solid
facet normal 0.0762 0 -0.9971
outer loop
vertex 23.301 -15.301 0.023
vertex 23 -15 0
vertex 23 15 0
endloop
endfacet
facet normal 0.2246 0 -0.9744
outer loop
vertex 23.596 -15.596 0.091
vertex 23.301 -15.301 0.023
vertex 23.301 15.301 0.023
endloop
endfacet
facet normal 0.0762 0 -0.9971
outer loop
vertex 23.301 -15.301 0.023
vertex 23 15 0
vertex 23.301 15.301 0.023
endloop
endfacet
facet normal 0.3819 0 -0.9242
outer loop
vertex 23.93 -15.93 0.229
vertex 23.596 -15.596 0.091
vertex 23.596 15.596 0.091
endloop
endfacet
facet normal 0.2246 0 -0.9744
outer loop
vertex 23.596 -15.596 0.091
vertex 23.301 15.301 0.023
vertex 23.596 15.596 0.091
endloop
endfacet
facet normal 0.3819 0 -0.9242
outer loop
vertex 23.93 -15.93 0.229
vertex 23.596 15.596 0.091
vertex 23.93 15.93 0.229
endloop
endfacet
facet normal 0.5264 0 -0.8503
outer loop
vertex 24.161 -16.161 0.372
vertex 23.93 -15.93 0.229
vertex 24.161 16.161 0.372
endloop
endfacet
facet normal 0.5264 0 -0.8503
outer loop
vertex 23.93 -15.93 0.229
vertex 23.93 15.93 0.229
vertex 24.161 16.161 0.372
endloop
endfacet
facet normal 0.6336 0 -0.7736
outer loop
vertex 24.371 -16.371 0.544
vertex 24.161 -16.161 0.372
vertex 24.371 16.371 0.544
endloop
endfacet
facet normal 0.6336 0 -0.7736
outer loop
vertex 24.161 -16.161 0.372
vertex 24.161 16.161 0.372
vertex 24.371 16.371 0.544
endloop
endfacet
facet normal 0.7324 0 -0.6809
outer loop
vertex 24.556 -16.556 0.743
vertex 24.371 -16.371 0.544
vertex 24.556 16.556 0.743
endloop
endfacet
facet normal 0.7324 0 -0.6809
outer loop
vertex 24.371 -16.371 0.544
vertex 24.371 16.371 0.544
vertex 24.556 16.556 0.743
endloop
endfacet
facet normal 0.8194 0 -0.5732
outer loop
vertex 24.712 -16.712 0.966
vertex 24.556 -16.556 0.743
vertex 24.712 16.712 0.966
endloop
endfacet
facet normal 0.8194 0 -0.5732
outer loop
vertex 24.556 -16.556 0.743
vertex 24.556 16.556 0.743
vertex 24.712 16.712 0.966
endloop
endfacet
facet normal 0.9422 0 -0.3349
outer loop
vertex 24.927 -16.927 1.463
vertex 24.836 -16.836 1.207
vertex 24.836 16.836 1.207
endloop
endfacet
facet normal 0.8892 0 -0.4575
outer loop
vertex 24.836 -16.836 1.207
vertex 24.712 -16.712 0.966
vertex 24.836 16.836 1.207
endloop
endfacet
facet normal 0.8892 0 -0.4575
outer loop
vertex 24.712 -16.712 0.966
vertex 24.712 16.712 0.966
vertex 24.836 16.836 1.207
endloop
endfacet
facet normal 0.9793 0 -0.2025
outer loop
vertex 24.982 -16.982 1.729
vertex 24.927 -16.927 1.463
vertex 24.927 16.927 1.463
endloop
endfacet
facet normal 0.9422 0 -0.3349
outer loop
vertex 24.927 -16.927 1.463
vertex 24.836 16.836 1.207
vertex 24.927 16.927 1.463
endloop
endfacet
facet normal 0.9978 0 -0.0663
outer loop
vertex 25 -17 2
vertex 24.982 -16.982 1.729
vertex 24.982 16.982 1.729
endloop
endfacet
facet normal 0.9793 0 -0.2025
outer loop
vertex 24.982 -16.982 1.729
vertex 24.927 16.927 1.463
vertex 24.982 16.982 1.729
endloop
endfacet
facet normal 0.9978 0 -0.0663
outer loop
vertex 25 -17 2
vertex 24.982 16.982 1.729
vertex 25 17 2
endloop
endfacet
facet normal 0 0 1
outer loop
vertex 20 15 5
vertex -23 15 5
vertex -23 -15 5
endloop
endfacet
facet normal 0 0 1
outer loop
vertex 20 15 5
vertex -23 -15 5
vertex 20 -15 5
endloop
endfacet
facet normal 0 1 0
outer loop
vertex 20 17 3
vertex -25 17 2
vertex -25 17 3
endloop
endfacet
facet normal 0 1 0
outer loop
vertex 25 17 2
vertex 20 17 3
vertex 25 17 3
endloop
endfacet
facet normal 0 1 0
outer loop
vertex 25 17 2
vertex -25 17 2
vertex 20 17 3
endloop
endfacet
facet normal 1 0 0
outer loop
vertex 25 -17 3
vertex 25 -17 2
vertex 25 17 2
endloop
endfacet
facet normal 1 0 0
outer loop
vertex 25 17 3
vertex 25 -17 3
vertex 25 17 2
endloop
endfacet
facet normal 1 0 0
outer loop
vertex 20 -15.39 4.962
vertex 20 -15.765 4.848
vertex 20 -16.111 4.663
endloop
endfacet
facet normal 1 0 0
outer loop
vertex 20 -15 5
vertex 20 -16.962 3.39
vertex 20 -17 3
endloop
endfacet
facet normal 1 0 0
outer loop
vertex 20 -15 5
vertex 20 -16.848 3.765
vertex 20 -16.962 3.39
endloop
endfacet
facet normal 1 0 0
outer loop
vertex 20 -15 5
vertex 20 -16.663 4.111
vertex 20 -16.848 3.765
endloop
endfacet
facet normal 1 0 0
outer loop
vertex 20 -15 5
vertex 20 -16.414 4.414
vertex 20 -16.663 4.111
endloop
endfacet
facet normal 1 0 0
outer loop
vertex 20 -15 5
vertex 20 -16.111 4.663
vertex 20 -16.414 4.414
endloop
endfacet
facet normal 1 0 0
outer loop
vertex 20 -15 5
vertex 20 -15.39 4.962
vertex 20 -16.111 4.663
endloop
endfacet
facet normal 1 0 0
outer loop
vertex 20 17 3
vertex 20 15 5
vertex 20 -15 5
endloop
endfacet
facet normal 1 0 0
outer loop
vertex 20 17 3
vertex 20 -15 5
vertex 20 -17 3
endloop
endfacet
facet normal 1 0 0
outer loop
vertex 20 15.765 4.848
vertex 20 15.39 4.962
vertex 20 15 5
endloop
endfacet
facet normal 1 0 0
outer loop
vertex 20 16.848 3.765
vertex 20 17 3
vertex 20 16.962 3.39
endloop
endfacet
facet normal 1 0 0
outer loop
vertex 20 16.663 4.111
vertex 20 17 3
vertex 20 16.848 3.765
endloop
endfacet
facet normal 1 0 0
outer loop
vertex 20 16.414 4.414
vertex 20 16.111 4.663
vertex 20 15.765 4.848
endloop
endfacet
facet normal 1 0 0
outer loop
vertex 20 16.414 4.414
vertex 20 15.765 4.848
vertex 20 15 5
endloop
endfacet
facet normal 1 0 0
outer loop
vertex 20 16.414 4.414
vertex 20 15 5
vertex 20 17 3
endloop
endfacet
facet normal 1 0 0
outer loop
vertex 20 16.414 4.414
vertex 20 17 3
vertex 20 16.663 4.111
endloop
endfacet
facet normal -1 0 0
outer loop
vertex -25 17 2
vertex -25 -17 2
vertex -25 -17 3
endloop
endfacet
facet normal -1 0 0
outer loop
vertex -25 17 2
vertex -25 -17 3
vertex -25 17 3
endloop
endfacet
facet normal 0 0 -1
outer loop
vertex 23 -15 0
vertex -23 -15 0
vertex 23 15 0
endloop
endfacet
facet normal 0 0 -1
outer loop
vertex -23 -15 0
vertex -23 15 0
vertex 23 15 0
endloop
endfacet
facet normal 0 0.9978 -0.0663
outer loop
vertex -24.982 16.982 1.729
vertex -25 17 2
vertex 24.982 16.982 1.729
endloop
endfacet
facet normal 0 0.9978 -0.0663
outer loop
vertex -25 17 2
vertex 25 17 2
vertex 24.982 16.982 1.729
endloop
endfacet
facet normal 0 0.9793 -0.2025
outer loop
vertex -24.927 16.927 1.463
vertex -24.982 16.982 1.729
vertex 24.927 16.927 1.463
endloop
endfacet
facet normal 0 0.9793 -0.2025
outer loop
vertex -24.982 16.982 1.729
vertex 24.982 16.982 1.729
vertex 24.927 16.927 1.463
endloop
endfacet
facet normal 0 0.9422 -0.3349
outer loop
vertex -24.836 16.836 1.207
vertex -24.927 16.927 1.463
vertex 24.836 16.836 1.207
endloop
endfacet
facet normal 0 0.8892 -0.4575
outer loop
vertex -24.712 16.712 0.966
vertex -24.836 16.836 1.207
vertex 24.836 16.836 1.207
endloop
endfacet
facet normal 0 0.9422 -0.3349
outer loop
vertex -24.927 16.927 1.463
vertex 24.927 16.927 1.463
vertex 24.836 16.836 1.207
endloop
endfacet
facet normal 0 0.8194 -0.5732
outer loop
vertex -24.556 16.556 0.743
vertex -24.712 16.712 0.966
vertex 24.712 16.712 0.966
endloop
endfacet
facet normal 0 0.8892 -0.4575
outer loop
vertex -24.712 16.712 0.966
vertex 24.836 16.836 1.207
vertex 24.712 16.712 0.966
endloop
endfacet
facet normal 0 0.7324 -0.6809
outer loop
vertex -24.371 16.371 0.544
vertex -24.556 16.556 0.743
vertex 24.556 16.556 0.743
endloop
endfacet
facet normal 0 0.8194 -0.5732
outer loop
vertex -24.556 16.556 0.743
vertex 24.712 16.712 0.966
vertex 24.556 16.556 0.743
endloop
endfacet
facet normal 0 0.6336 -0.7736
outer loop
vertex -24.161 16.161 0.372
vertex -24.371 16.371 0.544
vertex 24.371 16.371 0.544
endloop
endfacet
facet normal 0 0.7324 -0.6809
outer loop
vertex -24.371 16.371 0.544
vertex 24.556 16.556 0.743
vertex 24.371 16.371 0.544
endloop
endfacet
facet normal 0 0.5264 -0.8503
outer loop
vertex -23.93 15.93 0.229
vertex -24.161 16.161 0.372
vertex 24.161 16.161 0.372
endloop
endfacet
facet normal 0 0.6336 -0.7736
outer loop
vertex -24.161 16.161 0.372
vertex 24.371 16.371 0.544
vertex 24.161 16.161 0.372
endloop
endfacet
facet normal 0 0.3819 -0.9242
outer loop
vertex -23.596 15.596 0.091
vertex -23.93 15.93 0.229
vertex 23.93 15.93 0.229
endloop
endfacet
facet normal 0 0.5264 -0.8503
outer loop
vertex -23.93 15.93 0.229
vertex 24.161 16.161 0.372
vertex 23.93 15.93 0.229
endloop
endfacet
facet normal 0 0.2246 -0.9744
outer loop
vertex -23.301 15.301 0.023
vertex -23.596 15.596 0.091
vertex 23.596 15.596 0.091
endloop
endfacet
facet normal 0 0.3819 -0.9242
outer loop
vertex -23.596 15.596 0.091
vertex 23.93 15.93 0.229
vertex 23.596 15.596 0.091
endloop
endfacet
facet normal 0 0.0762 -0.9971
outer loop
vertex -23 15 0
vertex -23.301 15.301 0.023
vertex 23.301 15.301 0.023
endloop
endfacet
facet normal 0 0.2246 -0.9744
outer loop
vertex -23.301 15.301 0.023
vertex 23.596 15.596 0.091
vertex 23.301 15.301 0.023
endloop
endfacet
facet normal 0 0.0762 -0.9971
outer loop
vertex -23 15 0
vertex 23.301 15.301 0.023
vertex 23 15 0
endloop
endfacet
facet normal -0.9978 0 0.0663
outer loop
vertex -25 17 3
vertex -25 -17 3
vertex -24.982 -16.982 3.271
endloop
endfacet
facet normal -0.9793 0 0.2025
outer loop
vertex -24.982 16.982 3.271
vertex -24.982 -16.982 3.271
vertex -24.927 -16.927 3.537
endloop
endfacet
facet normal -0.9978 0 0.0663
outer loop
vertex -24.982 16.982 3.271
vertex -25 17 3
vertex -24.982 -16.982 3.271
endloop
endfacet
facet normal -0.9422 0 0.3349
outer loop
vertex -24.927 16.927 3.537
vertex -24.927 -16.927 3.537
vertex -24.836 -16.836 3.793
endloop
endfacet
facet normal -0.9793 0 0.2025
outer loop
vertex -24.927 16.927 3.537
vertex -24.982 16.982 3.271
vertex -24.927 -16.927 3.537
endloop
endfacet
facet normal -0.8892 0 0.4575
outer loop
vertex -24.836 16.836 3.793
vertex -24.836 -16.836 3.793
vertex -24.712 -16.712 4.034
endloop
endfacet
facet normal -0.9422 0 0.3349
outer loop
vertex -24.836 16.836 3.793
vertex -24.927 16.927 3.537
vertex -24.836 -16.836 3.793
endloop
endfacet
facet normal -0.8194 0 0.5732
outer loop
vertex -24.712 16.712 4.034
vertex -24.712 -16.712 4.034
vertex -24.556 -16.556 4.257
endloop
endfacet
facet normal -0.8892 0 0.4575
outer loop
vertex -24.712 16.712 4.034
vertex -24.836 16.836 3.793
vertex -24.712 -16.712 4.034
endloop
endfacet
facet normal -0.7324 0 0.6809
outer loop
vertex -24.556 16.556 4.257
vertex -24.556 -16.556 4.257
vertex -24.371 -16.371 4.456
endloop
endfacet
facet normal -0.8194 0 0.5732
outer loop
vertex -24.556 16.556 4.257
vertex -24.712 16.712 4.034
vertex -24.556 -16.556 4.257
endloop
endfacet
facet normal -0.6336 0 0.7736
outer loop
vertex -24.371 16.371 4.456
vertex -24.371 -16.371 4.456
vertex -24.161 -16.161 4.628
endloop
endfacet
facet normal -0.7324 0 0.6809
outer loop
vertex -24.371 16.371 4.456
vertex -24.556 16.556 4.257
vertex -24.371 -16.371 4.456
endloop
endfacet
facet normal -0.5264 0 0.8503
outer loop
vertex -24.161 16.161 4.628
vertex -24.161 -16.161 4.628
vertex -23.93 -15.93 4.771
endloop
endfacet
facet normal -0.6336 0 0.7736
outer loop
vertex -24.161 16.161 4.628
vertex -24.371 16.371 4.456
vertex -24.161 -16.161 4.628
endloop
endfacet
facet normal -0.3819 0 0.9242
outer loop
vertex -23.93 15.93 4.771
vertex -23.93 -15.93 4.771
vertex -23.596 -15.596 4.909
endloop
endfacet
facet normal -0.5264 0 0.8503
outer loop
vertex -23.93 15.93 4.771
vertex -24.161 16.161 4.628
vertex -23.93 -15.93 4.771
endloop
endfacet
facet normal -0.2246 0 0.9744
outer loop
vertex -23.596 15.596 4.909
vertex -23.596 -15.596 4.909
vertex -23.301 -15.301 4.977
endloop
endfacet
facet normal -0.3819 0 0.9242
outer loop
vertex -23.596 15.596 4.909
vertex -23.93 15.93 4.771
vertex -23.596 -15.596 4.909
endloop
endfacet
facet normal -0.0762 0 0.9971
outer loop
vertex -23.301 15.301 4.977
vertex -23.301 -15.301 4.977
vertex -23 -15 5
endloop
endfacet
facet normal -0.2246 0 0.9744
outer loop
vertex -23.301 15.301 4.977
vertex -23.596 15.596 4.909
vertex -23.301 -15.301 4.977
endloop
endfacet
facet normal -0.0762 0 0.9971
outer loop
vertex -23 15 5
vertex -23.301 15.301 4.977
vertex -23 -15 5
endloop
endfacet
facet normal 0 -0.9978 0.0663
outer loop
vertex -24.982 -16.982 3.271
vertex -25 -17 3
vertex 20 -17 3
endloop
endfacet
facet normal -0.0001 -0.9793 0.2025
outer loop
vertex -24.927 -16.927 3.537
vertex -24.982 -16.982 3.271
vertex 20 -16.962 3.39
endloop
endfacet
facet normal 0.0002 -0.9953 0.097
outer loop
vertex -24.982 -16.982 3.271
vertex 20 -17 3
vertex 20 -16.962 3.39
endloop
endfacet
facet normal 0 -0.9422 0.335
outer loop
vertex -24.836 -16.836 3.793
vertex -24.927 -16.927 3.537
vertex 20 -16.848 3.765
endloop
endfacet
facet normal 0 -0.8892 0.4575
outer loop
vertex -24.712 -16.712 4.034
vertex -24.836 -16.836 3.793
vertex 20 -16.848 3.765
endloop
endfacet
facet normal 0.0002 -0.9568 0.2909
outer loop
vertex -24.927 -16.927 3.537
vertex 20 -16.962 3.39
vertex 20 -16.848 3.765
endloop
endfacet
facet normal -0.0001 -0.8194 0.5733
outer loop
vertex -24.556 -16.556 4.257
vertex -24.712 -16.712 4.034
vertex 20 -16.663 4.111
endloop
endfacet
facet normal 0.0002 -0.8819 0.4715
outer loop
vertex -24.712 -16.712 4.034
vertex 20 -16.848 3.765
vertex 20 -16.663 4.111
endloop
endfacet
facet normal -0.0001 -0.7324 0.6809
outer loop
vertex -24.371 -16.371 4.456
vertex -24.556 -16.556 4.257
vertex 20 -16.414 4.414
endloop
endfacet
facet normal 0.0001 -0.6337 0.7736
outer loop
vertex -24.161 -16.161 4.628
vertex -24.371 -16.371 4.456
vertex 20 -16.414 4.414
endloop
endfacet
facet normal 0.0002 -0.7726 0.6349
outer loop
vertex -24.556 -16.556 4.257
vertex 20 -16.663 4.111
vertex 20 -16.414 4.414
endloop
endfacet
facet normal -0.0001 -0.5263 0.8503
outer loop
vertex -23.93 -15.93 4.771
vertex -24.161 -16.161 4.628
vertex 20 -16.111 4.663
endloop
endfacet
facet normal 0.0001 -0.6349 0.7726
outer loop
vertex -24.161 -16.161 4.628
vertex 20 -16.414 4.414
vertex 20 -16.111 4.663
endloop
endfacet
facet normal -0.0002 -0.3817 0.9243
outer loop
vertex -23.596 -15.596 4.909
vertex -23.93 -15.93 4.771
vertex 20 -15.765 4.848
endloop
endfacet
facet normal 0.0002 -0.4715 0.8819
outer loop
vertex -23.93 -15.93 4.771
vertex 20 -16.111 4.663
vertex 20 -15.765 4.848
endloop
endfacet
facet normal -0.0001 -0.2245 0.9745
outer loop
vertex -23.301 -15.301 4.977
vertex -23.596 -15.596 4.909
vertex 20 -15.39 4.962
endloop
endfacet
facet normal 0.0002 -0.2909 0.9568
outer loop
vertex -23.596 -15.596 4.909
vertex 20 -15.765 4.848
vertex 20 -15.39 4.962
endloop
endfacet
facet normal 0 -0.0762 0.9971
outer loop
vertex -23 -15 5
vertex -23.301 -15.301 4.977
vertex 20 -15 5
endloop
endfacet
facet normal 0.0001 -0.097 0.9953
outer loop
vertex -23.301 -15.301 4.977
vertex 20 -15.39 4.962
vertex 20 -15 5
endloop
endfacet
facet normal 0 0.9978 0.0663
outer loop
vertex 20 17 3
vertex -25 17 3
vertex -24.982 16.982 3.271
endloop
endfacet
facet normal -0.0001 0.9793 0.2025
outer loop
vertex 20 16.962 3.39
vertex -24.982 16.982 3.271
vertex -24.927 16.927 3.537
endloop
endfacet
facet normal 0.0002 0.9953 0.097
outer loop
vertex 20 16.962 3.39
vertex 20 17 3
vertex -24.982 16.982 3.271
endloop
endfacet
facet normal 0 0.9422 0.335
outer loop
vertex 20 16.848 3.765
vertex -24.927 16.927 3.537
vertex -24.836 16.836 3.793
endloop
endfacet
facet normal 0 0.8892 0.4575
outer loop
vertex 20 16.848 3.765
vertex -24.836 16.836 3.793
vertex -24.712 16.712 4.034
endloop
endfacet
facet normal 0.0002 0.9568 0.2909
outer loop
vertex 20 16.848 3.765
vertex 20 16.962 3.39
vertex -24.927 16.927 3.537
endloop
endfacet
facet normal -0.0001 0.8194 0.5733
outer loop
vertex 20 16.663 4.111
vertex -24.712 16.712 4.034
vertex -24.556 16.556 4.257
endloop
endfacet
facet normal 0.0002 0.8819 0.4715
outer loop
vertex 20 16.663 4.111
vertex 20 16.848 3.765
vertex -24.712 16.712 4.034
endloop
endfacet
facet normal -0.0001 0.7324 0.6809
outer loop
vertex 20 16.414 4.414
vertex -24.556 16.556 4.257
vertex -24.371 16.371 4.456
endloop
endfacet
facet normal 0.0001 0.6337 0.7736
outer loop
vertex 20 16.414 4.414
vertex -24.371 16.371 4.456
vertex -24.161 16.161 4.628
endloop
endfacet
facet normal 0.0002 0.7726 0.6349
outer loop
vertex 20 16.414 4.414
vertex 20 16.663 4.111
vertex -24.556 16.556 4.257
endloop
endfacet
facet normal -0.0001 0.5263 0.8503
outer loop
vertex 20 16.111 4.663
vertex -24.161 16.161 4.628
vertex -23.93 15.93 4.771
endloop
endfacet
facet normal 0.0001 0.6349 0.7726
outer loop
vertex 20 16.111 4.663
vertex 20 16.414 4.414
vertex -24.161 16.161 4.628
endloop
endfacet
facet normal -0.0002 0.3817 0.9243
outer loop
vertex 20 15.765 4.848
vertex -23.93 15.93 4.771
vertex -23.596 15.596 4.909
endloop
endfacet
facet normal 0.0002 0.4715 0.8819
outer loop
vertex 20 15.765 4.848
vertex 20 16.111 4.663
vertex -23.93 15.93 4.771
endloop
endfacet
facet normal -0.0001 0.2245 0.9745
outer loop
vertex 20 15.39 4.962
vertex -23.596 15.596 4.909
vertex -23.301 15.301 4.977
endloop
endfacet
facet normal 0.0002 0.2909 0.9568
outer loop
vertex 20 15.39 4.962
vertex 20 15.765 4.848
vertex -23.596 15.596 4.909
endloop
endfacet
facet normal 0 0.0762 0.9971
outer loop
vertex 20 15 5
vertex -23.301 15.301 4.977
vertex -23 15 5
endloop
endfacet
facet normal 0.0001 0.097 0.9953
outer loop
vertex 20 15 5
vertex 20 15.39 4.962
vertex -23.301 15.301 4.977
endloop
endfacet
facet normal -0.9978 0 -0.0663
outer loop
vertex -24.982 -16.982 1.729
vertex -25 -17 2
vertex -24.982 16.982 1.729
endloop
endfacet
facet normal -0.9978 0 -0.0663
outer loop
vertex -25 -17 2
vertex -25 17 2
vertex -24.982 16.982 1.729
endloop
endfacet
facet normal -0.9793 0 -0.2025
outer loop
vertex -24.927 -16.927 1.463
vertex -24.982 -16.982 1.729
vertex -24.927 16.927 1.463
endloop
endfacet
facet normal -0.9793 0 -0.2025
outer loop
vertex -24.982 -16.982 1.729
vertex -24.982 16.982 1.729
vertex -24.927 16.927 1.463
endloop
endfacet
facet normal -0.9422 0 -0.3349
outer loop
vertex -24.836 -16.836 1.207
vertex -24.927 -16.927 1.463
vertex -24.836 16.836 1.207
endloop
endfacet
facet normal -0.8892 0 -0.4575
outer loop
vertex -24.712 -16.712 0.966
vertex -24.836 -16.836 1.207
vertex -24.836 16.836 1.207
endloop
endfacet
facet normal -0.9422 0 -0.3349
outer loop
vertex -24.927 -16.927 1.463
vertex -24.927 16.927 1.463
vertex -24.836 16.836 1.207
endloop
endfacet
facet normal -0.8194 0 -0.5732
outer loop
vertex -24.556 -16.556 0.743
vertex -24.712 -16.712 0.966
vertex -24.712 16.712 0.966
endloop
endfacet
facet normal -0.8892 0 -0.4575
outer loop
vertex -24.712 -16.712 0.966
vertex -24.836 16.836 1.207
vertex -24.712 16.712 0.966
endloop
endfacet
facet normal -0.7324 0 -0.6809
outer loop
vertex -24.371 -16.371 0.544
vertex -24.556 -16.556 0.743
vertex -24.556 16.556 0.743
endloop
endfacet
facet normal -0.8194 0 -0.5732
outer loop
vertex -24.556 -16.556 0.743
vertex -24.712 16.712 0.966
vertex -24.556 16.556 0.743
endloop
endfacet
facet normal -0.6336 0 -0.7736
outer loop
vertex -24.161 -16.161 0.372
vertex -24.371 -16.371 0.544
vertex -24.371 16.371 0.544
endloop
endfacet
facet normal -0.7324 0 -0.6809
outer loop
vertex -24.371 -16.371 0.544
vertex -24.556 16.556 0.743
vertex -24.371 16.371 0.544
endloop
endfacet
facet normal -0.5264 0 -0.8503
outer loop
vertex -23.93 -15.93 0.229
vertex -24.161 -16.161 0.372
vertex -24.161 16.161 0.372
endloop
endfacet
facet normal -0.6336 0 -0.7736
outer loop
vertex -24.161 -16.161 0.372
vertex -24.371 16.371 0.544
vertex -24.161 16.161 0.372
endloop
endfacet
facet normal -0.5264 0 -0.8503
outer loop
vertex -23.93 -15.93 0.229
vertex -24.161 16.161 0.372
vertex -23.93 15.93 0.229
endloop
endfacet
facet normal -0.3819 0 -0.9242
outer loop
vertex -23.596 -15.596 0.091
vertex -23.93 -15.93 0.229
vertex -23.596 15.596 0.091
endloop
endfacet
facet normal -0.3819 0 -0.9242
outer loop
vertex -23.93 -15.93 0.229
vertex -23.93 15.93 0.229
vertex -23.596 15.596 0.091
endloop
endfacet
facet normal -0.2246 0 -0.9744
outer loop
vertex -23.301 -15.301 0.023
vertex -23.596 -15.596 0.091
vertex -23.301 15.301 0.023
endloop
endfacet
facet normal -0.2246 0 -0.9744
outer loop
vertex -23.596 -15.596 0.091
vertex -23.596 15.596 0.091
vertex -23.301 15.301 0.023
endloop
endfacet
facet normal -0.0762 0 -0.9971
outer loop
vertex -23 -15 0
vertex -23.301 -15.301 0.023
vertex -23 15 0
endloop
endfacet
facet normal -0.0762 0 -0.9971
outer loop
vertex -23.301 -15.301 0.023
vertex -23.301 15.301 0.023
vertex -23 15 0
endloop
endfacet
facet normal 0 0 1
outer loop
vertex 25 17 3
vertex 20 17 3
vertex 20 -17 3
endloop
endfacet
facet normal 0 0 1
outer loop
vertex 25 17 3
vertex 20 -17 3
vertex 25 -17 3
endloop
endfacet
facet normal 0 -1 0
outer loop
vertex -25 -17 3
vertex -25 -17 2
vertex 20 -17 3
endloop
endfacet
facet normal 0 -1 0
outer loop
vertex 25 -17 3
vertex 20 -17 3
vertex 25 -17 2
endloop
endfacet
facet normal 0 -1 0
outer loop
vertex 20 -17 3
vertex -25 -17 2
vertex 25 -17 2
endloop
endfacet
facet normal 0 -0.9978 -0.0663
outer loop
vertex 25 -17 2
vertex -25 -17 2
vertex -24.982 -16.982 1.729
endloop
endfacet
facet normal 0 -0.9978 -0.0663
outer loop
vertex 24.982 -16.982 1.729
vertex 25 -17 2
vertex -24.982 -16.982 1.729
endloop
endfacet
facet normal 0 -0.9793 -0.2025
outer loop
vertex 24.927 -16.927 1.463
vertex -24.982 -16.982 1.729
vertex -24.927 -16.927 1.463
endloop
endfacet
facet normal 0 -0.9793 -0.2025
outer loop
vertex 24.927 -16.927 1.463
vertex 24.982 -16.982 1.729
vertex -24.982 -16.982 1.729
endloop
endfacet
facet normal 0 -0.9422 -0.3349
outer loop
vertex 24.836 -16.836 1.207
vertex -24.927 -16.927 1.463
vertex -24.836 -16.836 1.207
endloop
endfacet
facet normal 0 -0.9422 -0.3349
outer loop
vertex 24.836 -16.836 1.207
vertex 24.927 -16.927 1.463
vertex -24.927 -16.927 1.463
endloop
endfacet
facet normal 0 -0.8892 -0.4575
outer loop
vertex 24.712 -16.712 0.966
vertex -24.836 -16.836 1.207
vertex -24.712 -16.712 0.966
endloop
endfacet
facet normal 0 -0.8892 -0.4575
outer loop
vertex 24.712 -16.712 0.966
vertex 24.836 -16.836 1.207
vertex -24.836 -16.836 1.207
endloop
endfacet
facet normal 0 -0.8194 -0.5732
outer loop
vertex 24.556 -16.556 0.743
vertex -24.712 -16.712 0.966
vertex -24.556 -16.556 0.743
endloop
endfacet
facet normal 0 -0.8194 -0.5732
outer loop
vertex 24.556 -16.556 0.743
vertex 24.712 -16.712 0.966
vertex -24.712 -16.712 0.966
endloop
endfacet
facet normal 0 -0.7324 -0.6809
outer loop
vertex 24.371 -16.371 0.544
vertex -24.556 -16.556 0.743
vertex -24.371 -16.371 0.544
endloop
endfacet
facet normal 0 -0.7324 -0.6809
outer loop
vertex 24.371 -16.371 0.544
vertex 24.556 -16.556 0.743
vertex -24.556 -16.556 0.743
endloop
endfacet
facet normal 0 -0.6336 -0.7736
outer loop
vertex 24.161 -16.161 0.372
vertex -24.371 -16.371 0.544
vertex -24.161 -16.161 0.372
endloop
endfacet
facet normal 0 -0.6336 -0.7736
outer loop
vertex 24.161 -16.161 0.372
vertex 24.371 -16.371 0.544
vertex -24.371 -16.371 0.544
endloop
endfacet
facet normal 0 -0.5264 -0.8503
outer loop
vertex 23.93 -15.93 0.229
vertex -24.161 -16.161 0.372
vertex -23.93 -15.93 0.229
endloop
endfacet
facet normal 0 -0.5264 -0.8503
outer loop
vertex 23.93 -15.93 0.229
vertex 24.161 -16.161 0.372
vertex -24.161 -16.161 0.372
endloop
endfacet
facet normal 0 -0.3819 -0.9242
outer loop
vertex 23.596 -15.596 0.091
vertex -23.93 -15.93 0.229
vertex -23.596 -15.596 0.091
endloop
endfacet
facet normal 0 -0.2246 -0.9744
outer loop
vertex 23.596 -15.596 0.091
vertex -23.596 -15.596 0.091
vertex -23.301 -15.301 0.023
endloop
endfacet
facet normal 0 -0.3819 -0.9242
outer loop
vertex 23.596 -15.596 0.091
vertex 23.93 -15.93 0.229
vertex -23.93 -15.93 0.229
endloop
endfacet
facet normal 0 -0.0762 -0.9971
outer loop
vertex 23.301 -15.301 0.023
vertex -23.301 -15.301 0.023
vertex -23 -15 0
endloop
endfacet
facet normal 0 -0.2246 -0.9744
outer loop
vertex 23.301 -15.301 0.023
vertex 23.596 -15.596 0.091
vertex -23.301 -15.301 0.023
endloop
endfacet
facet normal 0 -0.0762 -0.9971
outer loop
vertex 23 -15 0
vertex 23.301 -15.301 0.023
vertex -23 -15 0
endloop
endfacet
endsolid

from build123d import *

# Parameters (mm, degrees)
F0_W     = 50
F0_H     = 34
F1_DEPTH = 5
F2_W     = 5
F2_H     = 34
F3_DEPTH = 2
F4_R     = 2


with BuildPart() as f1:
    # F0 (on Top) → F1 (new body)
    with BuildSketch(Plane.XY):
        Rectangle(F0_W, F0_H)
    extrude(amount=F1_DEPTH)

    # F2 (on face) → F3 (cut)
    with BuildSketch(Plane.XY.offset(5)):
        with Locations((22.5, 0)):
            Rectangle(F2_W, F2_H)
    extrude(amount=-F3_DEPTH, mode=Mode.SUBTRACT)

    # F4
    f4_edges = [f1.edges().sort_by_distance(p)[0] for p in [
        (-2.5, 17, 5),
        (-2.5, -17, 5),
        (0, -17, 0),
        (0, 17, 0),
        (-25, 0, 0),
        (-25, 0, 5),
        (25, 0, 0),
    ]]
    fillet(f4_edges, radius=F4_R)


solid = f1.part
